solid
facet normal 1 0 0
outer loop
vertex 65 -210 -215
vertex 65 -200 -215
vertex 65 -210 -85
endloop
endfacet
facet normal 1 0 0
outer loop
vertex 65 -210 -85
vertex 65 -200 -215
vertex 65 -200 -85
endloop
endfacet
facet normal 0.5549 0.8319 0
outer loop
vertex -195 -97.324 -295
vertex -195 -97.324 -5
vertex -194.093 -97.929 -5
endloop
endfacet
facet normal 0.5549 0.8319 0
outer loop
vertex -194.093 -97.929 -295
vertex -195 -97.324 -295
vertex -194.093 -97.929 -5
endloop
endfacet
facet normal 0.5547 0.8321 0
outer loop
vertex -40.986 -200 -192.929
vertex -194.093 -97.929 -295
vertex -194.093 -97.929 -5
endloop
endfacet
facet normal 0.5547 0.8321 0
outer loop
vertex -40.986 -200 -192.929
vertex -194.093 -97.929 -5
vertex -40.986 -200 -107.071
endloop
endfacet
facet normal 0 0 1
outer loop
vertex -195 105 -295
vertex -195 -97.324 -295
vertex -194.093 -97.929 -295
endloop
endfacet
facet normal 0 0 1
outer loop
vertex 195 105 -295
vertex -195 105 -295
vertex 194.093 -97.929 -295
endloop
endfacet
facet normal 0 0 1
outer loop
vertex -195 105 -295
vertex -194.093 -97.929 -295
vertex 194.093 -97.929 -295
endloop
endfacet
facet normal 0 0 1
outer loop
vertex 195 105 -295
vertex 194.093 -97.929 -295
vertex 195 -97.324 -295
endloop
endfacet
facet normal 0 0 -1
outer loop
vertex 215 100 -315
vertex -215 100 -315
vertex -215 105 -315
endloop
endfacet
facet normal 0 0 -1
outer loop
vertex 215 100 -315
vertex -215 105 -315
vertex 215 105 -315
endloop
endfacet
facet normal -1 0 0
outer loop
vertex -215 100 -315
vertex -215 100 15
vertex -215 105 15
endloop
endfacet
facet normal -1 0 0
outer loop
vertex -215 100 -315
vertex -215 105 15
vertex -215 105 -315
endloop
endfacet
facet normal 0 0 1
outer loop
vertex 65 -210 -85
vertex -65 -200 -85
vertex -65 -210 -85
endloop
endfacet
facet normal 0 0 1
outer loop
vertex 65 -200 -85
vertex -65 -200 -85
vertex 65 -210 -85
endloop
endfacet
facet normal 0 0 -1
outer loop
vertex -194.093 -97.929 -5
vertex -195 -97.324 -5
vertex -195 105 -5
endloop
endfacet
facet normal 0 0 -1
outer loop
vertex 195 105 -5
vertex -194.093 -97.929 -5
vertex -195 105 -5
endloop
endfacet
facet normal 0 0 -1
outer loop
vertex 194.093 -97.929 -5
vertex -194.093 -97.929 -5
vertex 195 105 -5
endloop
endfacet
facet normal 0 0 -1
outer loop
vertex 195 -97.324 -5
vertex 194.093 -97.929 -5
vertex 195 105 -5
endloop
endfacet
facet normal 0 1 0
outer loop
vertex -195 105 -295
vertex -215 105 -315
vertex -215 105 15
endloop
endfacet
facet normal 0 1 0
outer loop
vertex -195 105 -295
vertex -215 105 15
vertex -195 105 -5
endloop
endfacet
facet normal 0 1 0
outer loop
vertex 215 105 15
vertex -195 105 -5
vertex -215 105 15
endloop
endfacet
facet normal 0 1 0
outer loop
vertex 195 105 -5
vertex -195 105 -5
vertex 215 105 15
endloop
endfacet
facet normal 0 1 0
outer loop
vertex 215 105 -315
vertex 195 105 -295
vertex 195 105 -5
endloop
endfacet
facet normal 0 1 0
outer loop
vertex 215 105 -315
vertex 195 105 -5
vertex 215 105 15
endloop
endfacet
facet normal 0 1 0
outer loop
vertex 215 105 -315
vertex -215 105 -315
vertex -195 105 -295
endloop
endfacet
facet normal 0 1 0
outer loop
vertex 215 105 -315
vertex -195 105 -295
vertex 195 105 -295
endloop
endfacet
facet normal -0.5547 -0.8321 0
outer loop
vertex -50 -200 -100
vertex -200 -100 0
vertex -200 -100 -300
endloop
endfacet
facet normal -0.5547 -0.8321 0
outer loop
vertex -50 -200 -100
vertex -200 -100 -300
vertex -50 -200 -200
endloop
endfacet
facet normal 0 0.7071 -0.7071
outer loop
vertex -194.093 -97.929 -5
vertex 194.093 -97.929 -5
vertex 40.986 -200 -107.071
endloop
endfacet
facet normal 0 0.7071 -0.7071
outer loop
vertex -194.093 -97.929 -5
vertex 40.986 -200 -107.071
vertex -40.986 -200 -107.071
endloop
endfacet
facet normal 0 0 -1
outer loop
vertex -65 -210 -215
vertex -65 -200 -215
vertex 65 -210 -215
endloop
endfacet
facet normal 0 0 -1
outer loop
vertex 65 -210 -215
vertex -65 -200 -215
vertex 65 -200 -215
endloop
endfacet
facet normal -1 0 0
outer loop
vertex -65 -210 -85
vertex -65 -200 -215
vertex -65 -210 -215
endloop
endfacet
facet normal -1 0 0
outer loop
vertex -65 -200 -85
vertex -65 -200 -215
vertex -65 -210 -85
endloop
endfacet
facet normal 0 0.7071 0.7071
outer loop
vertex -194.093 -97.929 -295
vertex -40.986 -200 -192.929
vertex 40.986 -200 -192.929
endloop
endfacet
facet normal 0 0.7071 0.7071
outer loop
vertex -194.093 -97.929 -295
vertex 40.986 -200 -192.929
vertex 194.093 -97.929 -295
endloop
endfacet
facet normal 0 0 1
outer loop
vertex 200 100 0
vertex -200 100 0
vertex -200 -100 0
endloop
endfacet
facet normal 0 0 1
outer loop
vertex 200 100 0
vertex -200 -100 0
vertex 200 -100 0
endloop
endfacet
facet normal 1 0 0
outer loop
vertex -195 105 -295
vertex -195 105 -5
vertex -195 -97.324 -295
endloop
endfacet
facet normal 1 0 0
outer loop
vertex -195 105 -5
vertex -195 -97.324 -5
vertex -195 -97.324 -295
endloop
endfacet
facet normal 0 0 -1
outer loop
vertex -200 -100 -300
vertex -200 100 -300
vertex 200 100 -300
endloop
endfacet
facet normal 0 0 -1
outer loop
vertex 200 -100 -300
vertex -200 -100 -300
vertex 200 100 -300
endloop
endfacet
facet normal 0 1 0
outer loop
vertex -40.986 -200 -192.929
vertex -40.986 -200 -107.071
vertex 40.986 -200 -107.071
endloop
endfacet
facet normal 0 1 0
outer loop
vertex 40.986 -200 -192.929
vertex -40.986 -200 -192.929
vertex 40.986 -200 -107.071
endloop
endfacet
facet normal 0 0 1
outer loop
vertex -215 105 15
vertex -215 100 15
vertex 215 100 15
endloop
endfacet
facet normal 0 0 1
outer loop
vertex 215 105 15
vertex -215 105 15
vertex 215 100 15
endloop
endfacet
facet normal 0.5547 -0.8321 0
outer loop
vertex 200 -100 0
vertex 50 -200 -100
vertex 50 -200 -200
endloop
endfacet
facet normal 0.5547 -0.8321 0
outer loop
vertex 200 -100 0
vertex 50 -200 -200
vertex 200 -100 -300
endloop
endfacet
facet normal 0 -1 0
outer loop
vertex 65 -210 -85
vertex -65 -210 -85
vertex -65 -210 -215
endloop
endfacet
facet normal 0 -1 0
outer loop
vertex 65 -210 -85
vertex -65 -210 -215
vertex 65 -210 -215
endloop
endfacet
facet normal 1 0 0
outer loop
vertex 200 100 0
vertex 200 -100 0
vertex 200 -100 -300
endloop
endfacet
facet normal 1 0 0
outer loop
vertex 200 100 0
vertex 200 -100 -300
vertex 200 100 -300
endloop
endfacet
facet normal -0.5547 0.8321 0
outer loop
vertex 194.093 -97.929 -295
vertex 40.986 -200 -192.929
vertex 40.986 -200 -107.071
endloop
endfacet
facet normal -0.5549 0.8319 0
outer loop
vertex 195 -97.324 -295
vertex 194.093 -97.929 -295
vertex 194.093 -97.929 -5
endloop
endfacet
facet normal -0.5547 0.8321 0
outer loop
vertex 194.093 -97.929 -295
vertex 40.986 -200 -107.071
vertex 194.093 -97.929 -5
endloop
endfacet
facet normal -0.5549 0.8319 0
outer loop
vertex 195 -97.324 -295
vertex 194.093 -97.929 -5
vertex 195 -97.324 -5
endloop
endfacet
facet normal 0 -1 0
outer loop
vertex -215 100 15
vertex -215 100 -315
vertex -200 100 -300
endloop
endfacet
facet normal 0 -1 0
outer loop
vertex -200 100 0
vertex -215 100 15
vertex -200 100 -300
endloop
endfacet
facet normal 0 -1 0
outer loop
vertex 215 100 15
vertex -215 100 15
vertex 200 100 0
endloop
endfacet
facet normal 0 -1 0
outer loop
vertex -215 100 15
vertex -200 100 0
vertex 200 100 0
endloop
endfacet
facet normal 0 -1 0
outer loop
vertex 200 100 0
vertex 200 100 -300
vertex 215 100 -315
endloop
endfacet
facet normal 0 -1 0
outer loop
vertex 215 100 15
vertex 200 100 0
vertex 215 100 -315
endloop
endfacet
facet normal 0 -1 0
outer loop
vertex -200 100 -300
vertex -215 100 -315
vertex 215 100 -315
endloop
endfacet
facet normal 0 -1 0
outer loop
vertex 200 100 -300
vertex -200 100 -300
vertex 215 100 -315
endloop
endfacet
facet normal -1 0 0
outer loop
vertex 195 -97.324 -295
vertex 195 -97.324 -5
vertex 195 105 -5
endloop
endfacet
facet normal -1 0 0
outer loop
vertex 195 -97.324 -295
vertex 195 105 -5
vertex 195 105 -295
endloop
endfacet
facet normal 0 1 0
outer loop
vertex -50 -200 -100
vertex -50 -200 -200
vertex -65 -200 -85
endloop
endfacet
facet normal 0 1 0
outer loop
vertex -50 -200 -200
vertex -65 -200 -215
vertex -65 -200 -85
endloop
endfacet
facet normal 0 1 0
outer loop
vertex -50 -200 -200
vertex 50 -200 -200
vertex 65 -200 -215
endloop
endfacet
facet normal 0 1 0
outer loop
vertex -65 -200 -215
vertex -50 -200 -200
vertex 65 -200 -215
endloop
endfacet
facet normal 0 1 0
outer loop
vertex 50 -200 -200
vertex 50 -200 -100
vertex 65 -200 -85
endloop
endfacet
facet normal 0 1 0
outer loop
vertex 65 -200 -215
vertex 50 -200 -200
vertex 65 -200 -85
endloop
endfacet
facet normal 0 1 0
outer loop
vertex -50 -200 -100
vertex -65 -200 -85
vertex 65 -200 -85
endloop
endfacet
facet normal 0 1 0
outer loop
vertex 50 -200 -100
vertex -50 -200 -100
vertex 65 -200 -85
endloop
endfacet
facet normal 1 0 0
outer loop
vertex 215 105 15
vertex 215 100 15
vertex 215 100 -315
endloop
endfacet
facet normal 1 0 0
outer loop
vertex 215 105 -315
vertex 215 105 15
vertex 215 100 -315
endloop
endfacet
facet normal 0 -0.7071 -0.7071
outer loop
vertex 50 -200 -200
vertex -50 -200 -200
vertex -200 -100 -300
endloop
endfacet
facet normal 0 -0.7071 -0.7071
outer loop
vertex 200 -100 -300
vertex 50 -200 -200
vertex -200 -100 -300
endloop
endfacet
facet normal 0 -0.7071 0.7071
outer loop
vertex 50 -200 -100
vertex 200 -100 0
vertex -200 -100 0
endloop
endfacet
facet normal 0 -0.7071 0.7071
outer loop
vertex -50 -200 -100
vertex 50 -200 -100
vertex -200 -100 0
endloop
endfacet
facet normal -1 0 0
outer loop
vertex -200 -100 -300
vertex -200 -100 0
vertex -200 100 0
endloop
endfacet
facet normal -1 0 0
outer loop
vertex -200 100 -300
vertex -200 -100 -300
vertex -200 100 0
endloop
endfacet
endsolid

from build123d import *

# Parameters (mm, degrees)
SKETCH1_W               = 400
SKETCH1_H               = 200
BOSS_EXTRUDE1_DEPTH     = 300
CUT_EXTRUDE1_DEPTH      = 413.310562562
CUT_EXTRUDE1_DEPTH_BACK = 413.310562562
SHELL1_T                = -5
SKETCH3_W               = 430
SKETCH3_H               = 330
BOSS_EXTRUDE2_DEPTH     = 5
SHELL2_START            = 100
SHELL2_OUTLINE_W        = 390
SHELL2_OUTLINE_H        = 290
SHELL2_DEPTH            = 5
SKETCH5_W               = 130
SKETCH5_H               = 130
BOSS_EXTRUDE3_DEPTH     = 10


# Read off the part's stored shape, not the designer's step: Shell2
with BuildPart() as part:
    # Sketch1 → Boss-Extrude1 (new body)
    with BuildSketch(Plane.XY):
        Rectangle(SKETCH1_W, SKETCH1_H)
        Polygon((-50, -200), (50, -200), (200, -100), (-200, -100), align=None)
    extrude(amount=-BOSS_EXTRUDE1_DEPTH)

    # Sketch2 → Cut-Extrude1 (cut, two sides: drawn at the far end of the back side and taken through both)
    with BuildSketch(Plane(origin=(0, 0, 0), x_dir=(0, 0, -1), z_dir=(1, 0, 0)).offset(-CUT_EXTRUDE1_DEPTH_BACK)):
        Polygon((0, -100), (100, -200), (0, -200), align=None)
        Polygon((300, -100), (300, -200), (200, -200), align=None)
    extrude(amount=CUT_EXTRUDE1_DEPTH + CUT_EXTRUDE1_DEPTH_BACK, mode=Mode.SUBTRACT)

    # Shell1
    shell1_openings = [part.faces().sort_by_distance(p)[0] for p in [
        (0, -200, -150),
        (0, 100, -150),
    ]]
    offset(amount=SHELL1_T, openings=shell1_openings, kind=Kind.INTERSECTION)

    # Sketch3 → Boss-Extrude2 (add)
    with BuildSketch(Plane(origin=(0, 100, 0), x_dir=(1, 0, 0), z_dir=(0, 1, 0))):
        with Locations((0, 150)):
            Rectangle(SKETCH3_W, SKETCH3_H)
    extrude(amount=BOSS_EXTRUDE2_DEPTH)

    # Shell2 outline → Shell2 (cut)
    with BuildSketch(Plane(origin=(0, 0, 0), x_dir=(1, 0, 0), z_dir=(0, 1, 0)).offset(SHELL2_START)):
        with Locations((0, 150)):
            Rectangle(SHELL2_OUTLINE_W, SHELL2_OUTLINE_H)
    extrude(amount=SHELL2_DEPTH, mode=Mode.SUBTRACT)

    # Sketch5 → Boss-Extrude3 (add)
    with BuildSketch(Plane.XZ.offset(200)):
        with Locations((0, -150)):
            Rectangle(SKETCH5_W, SKETCH5_H)
    extrude(amount=BOSS_EXTRUDE3_DEPTH)


solid = part.part
